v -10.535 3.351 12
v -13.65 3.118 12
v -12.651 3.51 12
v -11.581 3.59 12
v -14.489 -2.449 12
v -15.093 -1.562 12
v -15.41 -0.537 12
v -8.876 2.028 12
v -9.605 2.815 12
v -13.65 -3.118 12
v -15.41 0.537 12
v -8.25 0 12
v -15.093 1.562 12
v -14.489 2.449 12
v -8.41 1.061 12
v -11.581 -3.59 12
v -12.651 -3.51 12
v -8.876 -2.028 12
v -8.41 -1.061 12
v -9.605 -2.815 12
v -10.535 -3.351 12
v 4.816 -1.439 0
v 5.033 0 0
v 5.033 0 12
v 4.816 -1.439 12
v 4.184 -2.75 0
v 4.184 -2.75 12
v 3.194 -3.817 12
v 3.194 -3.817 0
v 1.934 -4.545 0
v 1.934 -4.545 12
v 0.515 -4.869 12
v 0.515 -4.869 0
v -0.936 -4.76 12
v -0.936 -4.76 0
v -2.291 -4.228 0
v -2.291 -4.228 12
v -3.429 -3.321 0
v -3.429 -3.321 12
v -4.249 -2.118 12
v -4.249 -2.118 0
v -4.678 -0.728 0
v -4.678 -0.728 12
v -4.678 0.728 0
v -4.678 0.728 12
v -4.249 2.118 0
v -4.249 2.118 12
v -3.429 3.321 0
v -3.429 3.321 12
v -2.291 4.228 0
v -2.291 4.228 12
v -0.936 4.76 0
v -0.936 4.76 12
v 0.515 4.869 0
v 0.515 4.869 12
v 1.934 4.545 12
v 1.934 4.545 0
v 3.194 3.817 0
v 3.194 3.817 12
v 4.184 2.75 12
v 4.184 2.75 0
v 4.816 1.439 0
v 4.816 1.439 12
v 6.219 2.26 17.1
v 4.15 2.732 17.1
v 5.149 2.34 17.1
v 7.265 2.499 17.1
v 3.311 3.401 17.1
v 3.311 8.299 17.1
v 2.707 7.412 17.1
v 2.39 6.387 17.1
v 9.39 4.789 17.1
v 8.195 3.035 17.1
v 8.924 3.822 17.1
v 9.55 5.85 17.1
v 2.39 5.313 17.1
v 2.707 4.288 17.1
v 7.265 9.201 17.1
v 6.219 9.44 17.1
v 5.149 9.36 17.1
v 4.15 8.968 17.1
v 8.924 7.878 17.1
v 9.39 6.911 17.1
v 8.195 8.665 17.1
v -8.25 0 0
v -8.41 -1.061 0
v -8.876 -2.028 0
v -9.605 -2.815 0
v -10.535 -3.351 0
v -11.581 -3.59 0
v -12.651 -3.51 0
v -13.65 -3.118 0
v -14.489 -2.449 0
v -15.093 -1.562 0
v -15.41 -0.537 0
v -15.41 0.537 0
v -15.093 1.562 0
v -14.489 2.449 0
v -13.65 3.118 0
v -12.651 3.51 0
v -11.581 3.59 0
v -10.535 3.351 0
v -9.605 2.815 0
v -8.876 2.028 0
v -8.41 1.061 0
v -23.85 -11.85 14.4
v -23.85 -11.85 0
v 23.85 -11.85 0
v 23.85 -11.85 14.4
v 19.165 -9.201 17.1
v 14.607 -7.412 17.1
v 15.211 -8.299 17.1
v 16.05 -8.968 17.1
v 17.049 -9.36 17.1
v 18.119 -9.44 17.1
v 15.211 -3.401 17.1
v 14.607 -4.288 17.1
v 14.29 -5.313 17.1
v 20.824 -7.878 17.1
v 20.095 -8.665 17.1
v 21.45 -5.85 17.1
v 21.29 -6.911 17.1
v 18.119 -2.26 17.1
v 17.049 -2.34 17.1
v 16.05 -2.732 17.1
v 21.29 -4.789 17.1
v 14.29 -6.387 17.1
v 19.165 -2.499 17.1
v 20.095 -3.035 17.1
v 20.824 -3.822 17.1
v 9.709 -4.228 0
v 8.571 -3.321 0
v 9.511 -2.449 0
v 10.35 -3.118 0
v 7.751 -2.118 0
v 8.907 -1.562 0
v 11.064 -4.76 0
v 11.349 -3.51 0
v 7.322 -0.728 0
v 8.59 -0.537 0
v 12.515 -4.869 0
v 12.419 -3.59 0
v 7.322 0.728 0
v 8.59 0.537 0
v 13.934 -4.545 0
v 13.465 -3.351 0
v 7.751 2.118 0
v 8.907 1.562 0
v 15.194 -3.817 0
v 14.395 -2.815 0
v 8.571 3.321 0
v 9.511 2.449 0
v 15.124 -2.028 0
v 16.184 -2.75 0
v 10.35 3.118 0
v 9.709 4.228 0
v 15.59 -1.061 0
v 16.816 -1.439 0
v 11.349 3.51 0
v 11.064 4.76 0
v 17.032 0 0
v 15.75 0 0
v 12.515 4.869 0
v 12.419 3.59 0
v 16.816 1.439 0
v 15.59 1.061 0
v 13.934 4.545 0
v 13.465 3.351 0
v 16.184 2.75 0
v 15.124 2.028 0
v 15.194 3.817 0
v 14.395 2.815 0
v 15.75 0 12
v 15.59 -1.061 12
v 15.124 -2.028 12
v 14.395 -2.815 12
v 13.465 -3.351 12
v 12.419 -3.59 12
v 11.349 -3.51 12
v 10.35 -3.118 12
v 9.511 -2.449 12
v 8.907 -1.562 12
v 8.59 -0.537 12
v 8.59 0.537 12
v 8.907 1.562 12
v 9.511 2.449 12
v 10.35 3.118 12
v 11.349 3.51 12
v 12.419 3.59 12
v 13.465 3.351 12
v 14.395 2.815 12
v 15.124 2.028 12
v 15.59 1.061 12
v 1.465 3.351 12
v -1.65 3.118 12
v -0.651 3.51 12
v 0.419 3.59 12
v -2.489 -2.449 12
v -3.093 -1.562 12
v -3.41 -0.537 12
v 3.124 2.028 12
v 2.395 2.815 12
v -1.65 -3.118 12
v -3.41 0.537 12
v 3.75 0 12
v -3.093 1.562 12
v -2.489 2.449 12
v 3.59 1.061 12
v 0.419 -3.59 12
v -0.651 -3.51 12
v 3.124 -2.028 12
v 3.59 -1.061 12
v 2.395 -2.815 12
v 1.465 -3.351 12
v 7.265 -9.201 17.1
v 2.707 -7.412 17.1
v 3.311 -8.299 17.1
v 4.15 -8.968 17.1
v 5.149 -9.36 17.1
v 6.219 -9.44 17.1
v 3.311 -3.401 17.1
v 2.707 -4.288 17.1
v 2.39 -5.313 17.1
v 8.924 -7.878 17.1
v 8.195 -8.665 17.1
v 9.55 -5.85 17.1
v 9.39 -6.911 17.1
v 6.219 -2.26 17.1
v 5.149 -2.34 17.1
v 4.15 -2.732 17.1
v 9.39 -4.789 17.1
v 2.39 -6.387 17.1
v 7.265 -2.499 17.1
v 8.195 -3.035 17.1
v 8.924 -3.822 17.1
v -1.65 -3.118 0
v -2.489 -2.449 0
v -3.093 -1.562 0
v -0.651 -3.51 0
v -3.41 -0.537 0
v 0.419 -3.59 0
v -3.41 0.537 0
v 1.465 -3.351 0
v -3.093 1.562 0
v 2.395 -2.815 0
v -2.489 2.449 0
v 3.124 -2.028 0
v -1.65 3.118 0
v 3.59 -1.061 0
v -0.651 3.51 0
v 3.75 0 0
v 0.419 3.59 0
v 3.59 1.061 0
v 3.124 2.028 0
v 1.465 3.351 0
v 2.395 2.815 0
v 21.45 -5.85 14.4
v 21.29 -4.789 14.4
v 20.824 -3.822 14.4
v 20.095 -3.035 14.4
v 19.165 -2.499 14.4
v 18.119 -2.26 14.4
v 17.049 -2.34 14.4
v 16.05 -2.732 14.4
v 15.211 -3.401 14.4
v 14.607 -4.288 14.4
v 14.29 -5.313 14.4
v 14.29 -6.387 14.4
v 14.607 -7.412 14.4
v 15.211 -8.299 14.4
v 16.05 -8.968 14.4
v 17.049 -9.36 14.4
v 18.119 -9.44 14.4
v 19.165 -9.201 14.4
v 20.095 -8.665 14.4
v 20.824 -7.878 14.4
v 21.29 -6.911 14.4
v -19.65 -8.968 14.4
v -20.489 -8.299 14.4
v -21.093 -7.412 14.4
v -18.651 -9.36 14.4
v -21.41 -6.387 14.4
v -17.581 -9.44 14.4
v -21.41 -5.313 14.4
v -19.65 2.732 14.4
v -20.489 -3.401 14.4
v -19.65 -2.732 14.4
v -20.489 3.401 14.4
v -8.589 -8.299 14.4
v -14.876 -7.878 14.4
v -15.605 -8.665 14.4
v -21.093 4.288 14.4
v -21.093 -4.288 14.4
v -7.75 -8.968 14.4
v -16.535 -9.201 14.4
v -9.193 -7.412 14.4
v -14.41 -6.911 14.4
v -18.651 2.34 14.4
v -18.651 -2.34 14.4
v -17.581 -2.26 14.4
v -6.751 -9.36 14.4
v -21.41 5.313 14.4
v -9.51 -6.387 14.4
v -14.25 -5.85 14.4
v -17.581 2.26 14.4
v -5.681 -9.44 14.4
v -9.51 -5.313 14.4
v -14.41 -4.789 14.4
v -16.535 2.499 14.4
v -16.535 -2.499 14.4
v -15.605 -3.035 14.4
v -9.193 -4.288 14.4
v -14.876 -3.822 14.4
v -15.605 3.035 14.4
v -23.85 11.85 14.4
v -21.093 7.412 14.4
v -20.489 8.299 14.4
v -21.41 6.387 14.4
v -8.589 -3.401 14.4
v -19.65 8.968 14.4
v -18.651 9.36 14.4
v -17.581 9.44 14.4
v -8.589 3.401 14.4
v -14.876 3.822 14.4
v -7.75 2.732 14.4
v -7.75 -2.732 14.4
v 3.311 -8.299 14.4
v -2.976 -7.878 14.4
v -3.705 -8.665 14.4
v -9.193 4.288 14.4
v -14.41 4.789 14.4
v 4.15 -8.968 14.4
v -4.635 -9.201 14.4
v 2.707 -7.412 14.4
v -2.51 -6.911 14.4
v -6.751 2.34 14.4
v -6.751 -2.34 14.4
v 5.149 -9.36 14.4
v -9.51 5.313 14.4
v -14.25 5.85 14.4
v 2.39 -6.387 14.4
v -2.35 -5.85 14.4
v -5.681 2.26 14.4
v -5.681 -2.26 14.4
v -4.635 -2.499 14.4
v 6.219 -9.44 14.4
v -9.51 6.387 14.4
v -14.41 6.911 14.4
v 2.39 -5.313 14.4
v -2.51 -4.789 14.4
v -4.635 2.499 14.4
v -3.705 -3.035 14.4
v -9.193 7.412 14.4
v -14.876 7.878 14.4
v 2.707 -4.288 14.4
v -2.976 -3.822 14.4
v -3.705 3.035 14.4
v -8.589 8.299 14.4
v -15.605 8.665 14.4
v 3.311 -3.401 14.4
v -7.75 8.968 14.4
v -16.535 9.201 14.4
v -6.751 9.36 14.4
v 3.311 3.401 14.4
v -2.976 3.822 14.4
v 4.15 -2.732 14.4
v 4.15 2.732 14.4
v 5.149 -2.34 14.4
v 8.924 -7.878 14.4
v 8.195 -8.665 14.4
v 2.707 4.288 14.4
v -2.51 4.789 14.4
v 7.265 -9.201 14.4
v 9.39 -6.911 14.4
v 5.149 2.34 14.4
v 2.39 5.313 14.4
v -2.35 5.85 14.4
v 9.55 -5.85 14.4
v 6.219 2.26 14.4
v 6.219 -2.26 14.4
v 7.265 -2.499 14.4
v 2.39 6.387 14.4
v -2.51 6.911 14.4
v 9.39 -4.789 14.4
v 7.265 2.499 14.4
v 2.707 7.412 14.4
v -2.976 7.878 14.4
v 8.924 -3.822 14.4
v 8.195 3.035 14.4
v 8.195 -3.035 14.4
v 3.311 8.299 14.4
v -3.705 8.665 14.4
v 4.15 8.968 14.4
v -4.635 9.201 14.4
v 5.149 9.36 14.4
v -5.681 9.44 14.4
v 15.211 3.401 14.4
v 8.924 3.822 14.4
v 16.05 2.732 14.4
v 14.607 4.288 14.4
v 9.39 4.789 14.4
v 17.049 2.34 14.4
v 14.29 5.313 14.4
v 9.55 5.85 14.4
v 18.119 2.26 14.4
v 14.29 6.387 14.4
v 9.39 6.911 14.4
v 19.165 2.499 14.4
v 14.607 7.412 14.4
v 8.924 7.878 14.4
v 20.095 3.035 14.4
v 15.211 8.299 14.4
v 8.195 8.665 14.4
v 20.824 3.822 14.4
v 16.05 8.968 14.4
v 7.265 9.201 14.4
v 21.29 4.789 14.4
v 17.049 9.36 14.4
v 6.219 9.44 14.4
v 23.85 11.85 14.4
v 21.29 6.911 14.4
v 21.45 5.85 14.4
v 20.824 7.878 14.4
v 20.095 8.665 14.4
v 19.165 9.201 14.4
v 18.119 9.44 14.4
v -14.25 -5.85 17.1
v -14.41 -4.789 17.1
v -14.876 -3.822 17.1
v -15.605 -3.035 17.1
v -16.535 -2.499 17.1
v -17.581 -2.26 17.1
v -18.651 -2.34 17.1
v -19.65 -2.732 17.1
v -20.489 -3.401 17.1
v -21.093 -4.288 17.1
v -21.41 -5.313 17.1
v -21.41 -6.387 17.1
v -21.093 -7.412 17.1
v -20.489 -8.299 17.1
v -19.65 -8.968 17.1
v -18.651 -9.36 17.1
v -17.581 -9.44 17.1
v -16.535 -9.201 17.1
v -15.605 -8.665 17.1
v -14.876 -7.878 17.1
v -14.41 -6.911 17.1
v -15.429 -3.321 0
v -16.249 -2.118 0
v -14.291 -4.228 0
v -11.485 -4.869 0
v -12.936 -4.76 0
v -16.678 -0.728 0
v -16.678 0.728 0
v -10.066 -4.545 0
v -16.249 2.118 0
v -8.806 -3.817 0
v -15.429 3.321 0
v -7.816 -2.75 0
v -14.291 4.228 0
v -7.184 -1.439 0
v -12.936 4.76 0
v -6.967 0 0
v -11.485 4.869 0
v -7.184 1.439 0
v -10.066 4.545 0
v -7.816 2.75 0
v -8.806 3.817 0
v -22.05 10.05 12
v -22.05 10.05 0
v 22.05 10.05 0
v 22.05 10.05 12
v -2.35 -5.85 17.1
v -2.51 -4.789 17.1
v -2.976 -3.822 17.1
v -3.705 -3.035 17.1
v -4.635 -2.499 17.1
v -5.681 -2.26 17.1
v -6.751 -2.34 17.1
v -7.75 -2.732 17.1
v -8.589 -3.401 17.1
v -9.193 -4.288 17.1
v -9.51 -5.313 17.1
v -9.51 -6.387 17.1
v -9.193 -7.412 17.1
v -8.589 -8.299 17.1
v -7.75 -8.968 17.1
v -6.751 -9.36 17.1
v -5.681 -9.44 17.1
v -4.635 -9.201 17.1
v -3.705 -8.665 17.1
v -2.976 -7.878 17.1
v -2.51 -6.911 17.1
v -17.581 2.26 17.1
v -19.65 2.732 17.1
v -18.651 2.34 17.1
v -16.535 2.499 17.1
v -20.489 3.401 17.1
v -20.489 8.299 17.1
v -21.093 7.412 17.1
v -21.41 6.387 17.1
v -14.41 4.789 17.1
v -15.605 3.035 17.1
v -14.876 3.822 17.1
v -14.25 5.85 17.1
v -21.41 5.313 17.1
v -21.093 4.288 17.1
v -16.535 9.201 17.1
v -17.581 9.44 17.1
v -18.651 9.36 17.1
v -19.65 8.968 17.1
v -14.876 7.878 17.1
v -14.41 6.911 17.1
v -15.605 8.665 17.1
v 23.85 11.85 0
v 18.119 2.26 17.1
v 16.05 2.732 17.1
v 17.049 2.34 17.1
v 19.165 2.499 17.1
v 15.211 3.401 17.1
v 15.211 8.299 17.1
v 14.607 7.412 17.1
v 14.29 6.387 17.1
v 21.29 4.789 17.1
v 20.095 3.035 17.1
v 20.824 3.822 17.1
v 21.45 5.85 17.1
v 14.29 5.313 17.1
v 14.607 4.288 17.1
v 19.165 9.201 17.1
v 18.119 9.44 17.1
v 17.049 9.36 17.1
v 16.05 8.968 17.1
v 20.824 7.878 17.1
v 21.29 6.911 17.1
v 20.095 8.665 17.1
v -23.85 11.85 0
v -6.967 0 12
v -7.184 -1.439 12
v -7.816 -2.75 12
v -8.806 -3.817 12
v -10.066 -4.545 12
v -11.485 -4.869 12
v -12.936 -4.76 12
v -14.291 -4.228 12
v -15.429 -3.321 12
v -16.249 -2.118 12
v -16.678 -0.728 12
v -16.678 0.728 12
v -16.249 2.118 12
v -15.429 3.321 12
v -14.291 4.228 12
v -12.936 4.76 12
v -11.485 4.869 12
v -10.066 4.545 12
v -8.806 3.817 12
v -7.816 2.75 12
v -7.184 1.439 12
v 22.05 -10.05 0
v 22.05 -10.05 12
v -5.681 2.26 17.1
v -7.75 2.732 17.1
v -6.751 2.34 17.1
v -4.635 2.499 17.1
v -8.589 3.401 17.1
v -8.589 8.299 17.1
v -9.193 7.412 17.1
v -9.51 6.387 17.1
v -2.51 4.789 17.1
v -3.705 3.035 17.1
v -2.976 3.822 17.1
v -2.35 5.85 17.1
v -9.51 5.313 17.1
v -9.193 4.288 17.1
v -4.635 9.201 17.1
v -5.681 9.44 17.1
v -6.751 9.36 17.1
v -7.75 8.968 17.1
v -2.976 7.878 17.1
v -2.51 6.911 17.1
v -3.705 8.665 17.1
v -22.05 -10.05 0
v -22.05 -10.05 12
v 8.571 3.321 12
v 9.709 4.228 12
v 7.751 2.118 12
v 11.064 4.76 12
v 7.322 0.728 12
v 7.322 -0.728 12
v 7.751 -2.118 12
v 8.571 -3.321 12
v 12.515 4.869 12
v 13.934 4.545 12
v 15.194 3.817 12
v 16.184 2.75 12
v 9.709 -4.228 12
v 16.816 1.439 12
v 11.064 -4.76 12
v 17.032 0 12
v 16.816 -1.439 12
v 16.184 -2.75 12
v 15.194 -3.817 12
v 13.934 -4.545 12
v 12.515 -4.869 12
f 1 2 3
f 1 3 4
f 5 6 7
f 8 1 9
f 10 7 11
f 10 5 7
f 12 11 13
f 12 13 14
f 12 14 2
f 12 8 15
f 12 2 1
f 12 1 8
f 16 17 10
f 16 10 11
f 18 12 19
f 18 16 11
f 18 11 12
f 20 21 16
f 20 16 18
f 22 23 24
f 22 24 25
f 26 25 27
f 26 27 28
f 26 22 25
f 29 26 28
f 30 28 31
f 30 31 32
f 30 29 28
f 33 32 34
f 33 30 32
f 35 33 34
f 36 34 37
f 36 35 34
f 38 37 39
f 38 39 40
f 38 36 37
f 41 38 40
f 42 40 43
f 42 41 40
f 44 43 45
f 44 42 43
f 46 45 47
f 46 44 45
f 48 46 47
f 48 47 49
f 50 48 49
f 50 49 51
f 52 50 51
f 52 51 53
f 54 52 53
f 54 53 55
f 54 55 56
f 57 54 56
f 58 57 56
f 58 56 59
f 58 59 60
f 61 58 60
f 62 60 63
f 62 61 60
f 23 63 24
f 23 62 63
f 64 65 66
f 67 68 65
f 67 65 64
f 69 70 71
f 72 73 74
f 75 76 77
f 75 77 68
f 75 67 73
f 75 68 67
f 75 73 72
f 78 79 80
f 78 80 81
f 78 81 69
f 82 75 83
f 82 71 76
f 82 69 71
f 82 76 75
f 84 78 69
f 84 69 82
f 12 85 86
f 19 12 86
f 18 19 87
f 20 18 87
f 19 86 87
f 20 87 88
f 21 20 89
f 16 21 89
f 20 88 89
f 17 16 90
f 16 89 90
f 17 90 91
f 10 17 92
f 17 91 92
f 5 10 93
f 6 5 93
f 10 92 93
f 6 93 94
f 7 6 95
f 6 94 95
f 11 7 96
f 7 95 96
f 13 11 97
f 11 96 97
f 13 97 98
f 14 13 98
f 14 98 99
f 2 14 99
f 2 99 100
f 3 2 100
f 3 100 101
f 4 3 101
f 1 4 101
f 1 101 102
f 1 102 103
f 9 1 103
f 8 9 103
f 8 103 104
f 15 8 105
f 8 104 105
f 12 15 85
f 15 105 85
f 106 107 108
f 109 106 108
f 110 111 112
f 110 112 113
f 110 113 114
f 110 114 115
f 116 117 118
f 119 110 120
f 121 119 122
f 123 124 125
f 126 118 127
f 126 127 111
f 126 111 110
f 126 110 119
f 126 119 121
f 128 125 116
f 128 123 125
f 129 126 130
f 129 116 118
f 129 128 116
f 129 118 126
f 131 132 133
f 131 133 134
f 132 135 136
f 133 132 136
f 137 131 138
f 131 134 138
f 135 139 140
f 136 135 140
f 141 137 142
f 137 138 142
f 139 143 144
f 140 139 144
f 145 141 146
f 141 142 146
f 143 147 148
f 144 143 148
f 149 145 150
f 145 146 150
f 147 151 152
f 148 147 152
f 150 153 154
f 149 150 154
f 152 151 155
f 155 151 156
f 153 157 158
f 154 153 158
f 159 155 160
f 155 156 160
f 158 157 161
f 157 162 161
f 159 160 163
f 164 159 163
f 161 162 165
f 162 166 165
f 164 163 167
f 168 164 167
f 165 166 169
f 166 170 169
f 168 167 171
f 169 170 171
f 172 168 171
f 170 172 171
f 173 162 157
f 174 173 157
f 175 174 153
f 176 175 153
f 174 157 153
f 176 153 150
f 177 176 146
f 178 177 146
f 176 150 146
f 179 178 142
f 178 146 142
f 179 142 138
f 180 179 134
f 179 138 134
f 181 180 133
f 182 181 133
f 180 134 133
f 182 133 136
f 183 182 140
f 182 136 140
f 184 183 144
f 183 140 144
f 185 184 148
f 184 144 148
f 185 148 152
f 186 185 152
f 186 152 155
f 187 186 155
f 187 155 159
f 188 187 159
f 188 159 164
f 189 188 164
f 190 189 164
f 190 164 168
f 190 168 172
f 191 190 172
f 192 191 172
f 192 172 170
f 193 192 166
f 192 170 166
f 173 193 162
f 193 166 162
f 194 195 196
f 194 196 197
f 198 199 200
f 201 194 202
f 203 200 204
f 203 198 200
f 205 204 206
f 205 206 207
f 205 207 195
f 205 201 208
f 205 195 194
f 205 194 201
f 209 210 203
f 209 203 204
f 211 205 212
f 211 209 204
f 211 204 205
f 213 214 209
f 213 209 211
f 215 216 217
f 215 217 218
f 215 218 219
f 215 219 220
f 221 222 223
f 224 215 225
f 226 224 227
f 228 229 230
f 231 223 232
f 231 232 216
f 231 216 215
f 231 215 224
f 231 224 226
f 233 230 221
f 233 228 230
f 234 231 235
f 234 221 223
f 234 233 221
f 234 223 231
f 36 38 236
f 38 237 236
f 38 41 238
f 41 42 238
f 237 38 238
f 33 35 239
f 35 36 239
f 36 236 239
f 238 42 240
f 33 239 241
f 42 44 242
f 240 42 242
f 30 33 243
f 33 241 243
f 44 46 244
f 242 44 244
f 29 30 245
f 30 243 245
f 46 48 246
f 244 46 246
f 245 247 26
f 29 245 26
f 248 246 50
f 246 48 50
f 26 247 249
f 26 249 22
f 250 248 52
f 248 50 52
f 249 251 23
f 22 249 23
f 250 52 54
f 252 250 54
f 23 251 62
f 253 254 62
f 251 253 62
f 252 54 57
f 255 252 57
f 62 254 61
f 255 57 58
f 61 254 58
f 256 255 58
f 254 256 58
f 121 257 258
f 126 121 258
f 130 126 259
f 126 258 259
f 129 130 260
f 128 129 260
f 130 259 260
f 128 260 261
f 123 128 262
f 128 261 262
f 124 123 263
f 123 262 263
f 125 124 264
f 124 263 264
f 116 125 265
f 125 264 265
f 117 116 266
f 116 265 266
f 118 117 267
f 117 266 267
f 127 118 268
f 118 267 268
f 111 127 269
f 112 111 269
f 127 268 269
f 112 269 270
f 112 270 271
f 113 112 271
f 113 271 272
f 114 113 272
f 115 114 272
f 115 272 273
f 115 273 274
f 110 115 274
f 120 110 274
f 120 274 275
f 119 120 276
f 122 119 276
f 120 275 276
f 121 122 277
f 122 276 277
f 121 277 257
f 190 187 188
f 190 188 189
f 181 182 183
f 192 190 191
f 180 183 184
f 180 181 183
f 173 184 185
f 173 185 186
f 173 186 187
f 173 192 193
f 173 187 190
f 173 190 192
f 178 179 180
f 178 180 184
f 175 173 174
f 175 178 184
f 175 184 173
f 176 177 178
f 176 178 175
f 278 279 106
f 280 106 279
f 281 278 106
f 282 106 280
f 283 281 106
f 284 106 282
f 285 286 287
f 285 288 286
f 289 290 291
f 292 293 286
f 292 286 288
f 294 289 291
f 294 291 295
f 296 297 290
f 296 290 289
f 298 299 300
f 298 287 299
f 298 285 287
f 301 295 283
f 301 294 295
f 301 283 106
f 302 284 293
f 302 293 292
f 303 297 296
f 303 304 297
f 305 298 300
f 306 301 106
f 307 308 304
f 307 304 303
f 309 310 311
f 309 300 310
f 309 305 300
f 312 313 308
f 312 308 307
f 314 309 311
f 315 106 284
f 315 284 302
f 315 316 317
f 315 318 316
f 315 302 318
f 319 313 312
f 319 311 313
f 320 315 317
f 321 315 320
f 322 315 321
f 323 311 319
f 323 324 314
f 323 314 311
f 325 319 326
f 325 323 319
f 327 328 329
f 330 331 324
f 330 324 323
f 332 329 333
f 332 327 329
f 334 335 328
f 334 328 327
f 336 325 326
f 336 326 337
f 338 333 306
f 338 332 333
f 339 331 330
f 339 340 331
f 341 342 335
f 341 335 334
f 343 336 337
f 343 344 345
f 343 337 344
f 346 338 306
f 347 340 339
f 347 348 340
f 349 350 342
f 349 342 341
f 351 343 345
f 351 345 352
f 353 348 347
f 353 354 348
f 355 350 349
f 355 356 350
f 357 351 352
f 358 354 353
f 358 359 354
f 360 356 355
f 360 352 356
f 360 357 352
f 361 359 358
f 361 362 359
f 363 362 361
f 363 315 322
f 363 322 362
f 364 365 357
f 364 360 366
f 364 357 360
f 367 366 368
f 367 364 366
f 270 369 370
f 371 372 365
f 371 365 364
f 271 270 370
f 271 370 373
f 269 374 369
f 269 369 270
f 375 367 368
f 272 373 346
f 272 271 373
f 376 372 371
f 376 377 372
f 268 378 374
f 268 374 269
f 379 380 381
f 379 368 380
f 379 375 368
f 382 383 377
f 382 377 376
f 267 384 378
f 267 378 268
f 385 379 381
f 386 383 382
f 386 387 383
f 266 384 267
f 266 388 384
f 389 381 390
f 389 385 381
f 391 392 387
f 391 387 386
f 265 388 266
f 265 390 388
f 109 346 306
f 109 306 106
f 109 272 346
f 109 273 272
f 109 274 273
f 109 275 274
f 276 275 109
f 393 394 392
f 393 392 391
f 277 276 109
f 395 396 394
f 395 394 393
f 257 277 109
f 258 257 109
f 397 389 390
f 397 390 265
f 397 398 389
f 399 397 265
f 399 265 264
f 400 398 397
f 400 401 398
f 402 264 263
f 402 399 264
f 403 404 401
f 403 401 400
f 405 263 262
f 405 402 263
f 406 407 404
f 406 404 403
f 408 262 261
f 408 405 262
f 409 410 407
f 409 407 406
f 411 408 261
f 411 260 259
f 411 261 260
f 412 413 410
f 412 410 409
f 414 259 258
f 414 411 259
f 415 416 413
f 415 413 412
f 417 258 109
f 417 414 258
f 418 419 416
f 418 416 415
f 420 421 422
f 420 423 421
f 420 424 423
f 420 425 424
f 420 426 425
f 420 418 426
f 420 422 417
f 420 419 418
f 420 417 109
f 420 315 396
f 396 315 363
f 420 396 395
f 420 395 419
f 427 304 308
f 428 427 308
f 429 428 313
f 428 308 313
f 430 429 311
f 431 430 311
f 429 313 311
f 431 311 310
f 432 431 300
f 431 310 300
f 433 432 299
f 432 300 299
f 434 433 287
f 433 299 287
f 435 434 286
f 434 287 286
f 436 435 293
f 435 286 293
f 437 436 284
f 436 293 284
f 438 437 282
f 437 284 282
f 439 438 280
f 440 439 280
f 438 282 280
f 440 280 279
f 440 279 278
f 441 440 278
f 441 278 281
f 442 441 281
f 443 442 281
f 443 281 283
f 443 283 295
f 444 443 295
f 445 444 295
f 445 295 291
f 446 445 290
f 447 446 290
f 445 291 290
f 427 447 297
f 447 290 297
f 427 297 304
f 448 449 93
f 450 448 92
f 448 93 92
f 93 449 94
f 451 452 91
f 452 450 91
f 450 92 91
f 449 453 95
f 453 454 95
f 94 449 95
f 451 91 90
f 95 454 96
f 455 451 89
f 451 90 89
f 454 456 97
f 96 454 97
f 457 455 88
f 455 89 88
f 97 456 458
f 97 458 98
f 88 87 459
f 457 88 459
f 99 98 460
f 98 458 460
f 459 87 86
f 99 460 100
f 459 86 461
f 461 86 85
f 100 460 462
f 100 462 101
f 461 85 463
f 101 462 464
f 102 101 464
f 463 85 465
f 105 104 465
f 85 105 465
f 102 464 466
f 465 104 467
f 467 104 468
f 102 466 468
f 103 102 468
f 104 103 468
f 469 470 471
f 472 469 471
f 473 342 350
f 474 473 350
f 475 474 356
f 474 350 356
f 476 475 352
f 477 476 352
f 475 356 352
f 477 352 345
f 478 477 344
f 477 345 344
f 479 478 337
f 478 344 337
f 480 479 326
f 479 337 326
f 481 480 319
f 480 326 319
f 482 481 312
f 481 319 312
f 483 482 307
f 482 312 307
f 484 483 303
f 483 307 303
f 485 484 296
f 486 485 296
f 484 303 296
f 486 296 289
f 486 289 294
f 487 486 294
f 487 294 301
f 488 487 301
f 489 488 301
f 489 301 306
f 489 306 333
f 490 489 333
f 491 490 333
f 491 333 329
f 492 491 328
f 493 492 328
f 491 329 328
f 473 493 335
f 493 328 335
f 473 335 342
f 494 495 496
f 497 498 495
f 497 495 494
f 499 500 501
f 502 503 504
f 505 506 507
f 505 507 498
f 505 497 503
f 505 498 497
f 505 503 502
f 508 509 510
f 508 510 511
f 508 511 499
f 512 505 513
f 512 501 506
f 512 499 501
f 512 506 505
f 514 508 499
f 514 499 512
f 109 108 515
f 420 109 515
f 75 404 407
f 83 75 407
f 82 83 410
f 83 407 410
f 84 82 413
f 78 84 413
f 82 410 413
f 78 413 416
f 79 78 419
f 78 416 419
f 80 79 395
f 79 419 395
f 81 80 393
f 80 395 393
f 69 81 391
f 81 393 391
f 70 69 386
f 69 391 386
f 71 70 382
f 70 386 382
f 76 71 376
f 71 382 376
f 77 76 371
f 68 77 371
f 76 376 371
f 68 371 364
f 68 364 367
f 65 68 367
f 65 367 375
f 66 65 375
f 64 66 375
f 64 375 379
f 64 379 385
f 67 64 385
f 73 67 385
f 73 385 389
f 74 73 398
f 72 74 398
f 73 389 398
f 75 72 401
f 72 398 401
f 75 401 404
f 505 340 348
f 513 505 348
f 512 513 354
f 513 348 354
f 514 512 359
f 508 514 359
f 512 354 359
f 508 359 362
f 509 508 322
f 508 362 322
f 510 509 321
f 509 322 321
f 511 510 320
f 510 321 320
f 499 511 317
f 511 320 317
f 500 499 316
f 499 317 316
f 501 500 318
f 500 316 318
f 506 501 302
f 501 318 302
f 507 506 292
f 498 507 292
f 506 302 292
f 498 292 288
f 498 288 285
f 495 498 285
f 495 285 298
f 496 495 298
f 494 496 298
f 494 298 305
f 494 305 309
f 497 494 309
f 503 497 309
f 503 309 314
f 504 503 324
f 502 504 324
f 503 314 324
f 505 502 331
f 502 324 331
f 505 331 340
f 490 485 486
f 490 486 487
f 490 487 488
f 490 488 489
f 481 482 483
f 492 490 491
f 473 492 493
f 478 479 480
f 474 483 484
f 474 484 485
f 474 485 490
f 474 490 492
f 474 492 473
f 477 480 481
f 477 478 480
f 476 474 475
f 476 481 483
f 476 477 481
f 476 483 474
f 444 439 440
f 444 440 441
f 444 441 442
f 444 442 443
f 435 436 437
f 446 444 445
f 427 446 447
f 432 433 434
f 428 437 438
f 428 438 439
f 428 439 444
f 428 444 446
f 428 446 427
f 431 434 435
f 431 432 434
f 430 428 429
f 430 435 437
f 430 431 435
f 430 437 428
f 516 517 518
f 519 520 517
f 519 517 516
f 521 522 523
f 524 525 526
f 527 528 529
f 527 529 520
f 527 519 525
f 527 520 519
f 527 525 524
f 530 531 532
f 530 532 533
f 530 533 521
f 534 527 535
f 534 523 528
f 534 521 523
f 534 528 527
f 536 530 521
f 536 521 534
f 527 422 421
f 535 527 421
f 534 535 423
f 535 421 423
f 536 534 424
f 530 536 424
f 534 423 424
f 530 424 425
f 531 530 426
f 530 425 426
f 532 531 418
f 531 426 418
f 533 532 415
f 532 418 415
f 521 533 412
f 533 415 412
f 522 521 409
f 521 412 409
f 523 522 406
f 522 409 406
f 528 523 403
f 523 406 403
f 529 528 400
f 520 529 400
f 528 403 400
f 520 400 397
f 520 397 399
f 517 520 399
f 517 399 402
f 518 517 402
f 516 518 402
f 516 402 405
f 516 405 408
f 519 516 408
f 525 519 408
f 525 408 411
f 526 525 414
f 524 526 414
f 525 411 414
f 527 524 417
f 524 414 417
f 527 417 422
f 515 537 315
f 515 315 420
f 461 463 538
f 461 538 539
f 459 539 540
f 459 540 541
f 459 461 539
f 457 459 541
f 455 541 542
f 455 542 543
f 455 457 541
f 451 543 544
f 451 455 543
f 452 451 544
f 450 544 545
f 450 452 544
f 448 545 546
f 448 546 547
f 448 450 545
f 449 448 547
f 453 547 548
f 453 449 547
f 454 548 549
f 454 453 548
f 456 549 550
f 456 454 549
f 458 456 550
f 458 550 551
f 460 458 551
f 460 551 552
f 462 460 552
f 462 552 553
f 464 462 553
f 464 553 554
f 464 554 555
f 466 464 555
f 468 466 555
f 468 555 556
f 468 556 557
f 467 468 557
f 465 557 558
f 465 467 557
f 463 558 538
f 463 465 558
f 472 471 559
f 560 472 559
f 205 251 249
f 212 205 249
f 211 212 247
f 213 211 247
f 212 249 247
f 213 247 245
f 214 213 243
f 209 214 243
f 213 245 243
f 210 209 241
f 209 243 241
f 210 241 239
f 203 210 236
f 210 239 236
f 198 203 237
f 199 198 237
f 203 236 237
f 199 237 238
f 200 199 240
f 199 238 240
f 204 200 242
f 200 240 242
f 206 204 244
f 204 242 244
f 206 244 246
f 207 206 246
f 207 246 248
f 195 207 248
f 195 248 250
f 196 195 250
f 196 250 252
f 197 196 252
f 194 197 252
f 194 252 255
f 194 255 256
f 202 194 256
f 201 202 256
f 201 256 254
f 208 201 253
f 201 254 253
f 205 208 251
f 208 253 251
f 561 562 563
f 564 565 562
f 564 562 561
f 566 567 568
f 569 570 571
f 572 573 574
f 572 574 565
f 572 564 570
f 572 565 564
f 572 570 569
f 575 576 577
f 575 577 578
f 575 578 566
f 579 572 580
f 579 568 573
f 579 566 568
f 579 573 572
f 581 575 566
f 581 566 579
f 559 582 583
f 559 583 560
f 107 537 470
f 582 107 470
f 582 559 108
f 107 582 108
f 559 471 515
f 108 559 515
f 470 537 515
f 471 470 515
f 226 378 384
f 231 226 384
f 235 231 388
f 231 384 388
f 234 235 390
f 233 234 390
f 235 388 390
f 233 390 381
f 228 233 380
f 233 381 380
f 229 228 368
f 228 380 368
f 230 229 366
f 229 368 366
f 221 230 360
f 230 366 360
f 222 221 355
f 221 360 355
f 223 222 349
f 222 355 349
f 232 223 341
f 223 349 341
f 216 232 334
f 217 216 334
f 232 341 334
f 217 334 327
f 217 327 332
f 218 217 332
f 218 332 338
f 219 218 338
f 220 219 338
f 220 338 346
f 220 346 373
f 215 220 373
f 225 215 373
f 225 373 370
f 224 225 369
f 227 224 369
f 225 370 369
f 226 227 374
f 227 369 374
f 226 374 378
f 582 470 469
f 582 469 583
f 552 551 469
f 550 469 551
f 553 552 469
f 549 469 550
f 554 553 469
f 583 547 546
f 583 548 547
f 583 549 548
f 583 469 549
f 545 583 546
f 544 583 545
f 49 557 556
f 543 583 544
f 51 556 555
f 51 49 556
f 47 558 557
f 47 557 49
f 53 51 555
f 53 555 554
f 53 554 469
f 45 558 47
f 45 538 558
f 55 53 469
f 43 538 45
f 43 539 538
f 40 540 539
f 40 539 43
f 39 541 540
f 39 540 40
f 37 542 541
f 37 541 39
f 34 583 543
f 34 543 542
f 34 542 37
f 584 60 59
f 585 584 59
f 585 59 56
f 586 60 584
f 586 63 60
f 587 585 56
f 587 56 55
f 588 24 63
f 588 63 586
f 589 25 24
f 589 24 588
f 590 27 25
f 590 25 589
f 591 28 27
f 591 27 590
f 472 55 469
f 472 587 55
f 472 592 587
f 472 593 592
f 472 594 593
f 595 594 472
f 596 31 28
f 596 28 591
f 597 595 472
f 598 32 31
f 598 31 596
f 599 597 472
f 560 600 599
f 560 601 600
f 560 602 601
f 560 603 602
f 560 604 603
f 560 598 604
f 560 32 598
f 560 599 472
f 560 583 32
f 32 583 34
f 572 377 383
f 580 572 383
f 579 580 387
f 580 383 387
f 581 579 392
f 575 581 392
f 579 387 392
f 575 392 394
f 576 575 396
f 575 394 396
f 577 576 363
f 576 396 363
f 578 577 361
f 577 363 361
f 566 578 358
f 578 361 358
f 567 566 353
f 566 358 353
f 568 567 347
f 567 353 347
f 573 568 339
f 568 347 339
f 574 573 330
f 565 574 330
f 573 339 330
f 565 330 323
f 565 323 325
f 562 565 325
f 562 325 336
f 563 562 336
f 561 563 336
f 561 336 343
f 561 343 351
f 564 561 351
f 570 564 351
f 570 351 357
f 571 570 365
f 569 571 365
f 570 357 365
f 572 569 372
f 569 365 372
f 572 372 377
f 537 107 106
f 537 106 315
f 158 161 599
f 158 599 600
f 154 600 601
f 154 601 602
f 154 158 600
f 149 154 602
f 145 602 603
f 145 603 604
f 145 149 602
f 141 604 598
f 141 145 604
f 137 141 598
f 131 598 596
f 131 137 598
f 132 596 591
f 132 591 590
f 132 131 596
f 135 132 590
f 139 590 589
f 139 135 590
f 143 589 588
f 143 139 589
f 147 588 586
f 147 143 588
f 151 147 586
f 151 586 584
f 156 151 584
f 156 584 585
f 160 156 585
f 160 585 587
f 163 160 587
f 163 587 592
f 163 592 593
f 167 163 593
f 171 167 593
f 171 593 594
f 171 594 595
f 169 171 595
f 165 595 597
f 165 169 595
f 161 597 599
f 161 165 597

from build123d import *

# Parameters (mm, degrees)
SKETCH_W            = 47.7
SKETCH_H            = 23.7
PAD_DEPTH           = 14.4
SKETCH001_R         = 3.6
PAD001_DEPTH        = 2.7
LINEARPATTERN_COUNT = 4
LINEARPATTERN_PITCH = 11.9
SKETCH002_W         = 44.1
SKETCH002_H         = 20.1
SKETCH002_R         = 4.8825
SKETCH002_R_2       = 3.6
POCKET_DEPTH        = 12


with BuildPart() as part:
    # Sketch → Pad (new body)
    with BuildSketch(Plane.XY):
        Rectangle(SKETCH_W, SKETCH_H)
    extrude(amount=PAD_DEPTH)

    # Sketch001 (on Face6 of Pad) → Pad001 (join)
    with BuildSketch(Plane.XY.offset(14.4)):
        with Locations((-17.85, -5.85)):
            Circle(SKETCH001_R)
        with Locations((-17.85, 5.85)):
            Circle(SKETCH001_R)
    pad001 = extrude(amount=PAD001_DEPTH)

    # LinearPattern: Pad001 ×4
    with Locations(*[(i * LINEARPATTERN_PITCH, 0, 0) for i in range(1, LINEARPATTERN_COUNT)]):
        add(pad001)

    # Sketch002 (on Face4 of LinearPattern) → Pocket (cut)
    with BuildSketch(Plane(origin=(0, 0, 0), x_dir=(1, 0, 0), z_dir=(0, 0, -1))):
        Rectangle(SKETCH002_W, SKETCH002_H)
        with Locations((-11.85, 0)):
            Circle(SKETCH002_R, mode=Mode.SUBTRACT)
        with Locations((0.15, 0)):
            Circle(SKETCH002_R, mode=Mode.SUBTRACT)
        with Locations((12.15, 0)):
            Circle(SKETCH002_R, mode=Mode.SUBTRACT)
        with Locations((-11.85, 0)):
            Circle(SKETCH002_R_2)
        with Locations((0.15, 0)):
            Circle(SKETCH002_R_2)
        with Locations((12.15, 0)):
            Circle(SKETCH002_R_2)
    extrude(amount=-POCKET_DEPTH, mode=Mode.SUBTRACT)


solid = part.part
